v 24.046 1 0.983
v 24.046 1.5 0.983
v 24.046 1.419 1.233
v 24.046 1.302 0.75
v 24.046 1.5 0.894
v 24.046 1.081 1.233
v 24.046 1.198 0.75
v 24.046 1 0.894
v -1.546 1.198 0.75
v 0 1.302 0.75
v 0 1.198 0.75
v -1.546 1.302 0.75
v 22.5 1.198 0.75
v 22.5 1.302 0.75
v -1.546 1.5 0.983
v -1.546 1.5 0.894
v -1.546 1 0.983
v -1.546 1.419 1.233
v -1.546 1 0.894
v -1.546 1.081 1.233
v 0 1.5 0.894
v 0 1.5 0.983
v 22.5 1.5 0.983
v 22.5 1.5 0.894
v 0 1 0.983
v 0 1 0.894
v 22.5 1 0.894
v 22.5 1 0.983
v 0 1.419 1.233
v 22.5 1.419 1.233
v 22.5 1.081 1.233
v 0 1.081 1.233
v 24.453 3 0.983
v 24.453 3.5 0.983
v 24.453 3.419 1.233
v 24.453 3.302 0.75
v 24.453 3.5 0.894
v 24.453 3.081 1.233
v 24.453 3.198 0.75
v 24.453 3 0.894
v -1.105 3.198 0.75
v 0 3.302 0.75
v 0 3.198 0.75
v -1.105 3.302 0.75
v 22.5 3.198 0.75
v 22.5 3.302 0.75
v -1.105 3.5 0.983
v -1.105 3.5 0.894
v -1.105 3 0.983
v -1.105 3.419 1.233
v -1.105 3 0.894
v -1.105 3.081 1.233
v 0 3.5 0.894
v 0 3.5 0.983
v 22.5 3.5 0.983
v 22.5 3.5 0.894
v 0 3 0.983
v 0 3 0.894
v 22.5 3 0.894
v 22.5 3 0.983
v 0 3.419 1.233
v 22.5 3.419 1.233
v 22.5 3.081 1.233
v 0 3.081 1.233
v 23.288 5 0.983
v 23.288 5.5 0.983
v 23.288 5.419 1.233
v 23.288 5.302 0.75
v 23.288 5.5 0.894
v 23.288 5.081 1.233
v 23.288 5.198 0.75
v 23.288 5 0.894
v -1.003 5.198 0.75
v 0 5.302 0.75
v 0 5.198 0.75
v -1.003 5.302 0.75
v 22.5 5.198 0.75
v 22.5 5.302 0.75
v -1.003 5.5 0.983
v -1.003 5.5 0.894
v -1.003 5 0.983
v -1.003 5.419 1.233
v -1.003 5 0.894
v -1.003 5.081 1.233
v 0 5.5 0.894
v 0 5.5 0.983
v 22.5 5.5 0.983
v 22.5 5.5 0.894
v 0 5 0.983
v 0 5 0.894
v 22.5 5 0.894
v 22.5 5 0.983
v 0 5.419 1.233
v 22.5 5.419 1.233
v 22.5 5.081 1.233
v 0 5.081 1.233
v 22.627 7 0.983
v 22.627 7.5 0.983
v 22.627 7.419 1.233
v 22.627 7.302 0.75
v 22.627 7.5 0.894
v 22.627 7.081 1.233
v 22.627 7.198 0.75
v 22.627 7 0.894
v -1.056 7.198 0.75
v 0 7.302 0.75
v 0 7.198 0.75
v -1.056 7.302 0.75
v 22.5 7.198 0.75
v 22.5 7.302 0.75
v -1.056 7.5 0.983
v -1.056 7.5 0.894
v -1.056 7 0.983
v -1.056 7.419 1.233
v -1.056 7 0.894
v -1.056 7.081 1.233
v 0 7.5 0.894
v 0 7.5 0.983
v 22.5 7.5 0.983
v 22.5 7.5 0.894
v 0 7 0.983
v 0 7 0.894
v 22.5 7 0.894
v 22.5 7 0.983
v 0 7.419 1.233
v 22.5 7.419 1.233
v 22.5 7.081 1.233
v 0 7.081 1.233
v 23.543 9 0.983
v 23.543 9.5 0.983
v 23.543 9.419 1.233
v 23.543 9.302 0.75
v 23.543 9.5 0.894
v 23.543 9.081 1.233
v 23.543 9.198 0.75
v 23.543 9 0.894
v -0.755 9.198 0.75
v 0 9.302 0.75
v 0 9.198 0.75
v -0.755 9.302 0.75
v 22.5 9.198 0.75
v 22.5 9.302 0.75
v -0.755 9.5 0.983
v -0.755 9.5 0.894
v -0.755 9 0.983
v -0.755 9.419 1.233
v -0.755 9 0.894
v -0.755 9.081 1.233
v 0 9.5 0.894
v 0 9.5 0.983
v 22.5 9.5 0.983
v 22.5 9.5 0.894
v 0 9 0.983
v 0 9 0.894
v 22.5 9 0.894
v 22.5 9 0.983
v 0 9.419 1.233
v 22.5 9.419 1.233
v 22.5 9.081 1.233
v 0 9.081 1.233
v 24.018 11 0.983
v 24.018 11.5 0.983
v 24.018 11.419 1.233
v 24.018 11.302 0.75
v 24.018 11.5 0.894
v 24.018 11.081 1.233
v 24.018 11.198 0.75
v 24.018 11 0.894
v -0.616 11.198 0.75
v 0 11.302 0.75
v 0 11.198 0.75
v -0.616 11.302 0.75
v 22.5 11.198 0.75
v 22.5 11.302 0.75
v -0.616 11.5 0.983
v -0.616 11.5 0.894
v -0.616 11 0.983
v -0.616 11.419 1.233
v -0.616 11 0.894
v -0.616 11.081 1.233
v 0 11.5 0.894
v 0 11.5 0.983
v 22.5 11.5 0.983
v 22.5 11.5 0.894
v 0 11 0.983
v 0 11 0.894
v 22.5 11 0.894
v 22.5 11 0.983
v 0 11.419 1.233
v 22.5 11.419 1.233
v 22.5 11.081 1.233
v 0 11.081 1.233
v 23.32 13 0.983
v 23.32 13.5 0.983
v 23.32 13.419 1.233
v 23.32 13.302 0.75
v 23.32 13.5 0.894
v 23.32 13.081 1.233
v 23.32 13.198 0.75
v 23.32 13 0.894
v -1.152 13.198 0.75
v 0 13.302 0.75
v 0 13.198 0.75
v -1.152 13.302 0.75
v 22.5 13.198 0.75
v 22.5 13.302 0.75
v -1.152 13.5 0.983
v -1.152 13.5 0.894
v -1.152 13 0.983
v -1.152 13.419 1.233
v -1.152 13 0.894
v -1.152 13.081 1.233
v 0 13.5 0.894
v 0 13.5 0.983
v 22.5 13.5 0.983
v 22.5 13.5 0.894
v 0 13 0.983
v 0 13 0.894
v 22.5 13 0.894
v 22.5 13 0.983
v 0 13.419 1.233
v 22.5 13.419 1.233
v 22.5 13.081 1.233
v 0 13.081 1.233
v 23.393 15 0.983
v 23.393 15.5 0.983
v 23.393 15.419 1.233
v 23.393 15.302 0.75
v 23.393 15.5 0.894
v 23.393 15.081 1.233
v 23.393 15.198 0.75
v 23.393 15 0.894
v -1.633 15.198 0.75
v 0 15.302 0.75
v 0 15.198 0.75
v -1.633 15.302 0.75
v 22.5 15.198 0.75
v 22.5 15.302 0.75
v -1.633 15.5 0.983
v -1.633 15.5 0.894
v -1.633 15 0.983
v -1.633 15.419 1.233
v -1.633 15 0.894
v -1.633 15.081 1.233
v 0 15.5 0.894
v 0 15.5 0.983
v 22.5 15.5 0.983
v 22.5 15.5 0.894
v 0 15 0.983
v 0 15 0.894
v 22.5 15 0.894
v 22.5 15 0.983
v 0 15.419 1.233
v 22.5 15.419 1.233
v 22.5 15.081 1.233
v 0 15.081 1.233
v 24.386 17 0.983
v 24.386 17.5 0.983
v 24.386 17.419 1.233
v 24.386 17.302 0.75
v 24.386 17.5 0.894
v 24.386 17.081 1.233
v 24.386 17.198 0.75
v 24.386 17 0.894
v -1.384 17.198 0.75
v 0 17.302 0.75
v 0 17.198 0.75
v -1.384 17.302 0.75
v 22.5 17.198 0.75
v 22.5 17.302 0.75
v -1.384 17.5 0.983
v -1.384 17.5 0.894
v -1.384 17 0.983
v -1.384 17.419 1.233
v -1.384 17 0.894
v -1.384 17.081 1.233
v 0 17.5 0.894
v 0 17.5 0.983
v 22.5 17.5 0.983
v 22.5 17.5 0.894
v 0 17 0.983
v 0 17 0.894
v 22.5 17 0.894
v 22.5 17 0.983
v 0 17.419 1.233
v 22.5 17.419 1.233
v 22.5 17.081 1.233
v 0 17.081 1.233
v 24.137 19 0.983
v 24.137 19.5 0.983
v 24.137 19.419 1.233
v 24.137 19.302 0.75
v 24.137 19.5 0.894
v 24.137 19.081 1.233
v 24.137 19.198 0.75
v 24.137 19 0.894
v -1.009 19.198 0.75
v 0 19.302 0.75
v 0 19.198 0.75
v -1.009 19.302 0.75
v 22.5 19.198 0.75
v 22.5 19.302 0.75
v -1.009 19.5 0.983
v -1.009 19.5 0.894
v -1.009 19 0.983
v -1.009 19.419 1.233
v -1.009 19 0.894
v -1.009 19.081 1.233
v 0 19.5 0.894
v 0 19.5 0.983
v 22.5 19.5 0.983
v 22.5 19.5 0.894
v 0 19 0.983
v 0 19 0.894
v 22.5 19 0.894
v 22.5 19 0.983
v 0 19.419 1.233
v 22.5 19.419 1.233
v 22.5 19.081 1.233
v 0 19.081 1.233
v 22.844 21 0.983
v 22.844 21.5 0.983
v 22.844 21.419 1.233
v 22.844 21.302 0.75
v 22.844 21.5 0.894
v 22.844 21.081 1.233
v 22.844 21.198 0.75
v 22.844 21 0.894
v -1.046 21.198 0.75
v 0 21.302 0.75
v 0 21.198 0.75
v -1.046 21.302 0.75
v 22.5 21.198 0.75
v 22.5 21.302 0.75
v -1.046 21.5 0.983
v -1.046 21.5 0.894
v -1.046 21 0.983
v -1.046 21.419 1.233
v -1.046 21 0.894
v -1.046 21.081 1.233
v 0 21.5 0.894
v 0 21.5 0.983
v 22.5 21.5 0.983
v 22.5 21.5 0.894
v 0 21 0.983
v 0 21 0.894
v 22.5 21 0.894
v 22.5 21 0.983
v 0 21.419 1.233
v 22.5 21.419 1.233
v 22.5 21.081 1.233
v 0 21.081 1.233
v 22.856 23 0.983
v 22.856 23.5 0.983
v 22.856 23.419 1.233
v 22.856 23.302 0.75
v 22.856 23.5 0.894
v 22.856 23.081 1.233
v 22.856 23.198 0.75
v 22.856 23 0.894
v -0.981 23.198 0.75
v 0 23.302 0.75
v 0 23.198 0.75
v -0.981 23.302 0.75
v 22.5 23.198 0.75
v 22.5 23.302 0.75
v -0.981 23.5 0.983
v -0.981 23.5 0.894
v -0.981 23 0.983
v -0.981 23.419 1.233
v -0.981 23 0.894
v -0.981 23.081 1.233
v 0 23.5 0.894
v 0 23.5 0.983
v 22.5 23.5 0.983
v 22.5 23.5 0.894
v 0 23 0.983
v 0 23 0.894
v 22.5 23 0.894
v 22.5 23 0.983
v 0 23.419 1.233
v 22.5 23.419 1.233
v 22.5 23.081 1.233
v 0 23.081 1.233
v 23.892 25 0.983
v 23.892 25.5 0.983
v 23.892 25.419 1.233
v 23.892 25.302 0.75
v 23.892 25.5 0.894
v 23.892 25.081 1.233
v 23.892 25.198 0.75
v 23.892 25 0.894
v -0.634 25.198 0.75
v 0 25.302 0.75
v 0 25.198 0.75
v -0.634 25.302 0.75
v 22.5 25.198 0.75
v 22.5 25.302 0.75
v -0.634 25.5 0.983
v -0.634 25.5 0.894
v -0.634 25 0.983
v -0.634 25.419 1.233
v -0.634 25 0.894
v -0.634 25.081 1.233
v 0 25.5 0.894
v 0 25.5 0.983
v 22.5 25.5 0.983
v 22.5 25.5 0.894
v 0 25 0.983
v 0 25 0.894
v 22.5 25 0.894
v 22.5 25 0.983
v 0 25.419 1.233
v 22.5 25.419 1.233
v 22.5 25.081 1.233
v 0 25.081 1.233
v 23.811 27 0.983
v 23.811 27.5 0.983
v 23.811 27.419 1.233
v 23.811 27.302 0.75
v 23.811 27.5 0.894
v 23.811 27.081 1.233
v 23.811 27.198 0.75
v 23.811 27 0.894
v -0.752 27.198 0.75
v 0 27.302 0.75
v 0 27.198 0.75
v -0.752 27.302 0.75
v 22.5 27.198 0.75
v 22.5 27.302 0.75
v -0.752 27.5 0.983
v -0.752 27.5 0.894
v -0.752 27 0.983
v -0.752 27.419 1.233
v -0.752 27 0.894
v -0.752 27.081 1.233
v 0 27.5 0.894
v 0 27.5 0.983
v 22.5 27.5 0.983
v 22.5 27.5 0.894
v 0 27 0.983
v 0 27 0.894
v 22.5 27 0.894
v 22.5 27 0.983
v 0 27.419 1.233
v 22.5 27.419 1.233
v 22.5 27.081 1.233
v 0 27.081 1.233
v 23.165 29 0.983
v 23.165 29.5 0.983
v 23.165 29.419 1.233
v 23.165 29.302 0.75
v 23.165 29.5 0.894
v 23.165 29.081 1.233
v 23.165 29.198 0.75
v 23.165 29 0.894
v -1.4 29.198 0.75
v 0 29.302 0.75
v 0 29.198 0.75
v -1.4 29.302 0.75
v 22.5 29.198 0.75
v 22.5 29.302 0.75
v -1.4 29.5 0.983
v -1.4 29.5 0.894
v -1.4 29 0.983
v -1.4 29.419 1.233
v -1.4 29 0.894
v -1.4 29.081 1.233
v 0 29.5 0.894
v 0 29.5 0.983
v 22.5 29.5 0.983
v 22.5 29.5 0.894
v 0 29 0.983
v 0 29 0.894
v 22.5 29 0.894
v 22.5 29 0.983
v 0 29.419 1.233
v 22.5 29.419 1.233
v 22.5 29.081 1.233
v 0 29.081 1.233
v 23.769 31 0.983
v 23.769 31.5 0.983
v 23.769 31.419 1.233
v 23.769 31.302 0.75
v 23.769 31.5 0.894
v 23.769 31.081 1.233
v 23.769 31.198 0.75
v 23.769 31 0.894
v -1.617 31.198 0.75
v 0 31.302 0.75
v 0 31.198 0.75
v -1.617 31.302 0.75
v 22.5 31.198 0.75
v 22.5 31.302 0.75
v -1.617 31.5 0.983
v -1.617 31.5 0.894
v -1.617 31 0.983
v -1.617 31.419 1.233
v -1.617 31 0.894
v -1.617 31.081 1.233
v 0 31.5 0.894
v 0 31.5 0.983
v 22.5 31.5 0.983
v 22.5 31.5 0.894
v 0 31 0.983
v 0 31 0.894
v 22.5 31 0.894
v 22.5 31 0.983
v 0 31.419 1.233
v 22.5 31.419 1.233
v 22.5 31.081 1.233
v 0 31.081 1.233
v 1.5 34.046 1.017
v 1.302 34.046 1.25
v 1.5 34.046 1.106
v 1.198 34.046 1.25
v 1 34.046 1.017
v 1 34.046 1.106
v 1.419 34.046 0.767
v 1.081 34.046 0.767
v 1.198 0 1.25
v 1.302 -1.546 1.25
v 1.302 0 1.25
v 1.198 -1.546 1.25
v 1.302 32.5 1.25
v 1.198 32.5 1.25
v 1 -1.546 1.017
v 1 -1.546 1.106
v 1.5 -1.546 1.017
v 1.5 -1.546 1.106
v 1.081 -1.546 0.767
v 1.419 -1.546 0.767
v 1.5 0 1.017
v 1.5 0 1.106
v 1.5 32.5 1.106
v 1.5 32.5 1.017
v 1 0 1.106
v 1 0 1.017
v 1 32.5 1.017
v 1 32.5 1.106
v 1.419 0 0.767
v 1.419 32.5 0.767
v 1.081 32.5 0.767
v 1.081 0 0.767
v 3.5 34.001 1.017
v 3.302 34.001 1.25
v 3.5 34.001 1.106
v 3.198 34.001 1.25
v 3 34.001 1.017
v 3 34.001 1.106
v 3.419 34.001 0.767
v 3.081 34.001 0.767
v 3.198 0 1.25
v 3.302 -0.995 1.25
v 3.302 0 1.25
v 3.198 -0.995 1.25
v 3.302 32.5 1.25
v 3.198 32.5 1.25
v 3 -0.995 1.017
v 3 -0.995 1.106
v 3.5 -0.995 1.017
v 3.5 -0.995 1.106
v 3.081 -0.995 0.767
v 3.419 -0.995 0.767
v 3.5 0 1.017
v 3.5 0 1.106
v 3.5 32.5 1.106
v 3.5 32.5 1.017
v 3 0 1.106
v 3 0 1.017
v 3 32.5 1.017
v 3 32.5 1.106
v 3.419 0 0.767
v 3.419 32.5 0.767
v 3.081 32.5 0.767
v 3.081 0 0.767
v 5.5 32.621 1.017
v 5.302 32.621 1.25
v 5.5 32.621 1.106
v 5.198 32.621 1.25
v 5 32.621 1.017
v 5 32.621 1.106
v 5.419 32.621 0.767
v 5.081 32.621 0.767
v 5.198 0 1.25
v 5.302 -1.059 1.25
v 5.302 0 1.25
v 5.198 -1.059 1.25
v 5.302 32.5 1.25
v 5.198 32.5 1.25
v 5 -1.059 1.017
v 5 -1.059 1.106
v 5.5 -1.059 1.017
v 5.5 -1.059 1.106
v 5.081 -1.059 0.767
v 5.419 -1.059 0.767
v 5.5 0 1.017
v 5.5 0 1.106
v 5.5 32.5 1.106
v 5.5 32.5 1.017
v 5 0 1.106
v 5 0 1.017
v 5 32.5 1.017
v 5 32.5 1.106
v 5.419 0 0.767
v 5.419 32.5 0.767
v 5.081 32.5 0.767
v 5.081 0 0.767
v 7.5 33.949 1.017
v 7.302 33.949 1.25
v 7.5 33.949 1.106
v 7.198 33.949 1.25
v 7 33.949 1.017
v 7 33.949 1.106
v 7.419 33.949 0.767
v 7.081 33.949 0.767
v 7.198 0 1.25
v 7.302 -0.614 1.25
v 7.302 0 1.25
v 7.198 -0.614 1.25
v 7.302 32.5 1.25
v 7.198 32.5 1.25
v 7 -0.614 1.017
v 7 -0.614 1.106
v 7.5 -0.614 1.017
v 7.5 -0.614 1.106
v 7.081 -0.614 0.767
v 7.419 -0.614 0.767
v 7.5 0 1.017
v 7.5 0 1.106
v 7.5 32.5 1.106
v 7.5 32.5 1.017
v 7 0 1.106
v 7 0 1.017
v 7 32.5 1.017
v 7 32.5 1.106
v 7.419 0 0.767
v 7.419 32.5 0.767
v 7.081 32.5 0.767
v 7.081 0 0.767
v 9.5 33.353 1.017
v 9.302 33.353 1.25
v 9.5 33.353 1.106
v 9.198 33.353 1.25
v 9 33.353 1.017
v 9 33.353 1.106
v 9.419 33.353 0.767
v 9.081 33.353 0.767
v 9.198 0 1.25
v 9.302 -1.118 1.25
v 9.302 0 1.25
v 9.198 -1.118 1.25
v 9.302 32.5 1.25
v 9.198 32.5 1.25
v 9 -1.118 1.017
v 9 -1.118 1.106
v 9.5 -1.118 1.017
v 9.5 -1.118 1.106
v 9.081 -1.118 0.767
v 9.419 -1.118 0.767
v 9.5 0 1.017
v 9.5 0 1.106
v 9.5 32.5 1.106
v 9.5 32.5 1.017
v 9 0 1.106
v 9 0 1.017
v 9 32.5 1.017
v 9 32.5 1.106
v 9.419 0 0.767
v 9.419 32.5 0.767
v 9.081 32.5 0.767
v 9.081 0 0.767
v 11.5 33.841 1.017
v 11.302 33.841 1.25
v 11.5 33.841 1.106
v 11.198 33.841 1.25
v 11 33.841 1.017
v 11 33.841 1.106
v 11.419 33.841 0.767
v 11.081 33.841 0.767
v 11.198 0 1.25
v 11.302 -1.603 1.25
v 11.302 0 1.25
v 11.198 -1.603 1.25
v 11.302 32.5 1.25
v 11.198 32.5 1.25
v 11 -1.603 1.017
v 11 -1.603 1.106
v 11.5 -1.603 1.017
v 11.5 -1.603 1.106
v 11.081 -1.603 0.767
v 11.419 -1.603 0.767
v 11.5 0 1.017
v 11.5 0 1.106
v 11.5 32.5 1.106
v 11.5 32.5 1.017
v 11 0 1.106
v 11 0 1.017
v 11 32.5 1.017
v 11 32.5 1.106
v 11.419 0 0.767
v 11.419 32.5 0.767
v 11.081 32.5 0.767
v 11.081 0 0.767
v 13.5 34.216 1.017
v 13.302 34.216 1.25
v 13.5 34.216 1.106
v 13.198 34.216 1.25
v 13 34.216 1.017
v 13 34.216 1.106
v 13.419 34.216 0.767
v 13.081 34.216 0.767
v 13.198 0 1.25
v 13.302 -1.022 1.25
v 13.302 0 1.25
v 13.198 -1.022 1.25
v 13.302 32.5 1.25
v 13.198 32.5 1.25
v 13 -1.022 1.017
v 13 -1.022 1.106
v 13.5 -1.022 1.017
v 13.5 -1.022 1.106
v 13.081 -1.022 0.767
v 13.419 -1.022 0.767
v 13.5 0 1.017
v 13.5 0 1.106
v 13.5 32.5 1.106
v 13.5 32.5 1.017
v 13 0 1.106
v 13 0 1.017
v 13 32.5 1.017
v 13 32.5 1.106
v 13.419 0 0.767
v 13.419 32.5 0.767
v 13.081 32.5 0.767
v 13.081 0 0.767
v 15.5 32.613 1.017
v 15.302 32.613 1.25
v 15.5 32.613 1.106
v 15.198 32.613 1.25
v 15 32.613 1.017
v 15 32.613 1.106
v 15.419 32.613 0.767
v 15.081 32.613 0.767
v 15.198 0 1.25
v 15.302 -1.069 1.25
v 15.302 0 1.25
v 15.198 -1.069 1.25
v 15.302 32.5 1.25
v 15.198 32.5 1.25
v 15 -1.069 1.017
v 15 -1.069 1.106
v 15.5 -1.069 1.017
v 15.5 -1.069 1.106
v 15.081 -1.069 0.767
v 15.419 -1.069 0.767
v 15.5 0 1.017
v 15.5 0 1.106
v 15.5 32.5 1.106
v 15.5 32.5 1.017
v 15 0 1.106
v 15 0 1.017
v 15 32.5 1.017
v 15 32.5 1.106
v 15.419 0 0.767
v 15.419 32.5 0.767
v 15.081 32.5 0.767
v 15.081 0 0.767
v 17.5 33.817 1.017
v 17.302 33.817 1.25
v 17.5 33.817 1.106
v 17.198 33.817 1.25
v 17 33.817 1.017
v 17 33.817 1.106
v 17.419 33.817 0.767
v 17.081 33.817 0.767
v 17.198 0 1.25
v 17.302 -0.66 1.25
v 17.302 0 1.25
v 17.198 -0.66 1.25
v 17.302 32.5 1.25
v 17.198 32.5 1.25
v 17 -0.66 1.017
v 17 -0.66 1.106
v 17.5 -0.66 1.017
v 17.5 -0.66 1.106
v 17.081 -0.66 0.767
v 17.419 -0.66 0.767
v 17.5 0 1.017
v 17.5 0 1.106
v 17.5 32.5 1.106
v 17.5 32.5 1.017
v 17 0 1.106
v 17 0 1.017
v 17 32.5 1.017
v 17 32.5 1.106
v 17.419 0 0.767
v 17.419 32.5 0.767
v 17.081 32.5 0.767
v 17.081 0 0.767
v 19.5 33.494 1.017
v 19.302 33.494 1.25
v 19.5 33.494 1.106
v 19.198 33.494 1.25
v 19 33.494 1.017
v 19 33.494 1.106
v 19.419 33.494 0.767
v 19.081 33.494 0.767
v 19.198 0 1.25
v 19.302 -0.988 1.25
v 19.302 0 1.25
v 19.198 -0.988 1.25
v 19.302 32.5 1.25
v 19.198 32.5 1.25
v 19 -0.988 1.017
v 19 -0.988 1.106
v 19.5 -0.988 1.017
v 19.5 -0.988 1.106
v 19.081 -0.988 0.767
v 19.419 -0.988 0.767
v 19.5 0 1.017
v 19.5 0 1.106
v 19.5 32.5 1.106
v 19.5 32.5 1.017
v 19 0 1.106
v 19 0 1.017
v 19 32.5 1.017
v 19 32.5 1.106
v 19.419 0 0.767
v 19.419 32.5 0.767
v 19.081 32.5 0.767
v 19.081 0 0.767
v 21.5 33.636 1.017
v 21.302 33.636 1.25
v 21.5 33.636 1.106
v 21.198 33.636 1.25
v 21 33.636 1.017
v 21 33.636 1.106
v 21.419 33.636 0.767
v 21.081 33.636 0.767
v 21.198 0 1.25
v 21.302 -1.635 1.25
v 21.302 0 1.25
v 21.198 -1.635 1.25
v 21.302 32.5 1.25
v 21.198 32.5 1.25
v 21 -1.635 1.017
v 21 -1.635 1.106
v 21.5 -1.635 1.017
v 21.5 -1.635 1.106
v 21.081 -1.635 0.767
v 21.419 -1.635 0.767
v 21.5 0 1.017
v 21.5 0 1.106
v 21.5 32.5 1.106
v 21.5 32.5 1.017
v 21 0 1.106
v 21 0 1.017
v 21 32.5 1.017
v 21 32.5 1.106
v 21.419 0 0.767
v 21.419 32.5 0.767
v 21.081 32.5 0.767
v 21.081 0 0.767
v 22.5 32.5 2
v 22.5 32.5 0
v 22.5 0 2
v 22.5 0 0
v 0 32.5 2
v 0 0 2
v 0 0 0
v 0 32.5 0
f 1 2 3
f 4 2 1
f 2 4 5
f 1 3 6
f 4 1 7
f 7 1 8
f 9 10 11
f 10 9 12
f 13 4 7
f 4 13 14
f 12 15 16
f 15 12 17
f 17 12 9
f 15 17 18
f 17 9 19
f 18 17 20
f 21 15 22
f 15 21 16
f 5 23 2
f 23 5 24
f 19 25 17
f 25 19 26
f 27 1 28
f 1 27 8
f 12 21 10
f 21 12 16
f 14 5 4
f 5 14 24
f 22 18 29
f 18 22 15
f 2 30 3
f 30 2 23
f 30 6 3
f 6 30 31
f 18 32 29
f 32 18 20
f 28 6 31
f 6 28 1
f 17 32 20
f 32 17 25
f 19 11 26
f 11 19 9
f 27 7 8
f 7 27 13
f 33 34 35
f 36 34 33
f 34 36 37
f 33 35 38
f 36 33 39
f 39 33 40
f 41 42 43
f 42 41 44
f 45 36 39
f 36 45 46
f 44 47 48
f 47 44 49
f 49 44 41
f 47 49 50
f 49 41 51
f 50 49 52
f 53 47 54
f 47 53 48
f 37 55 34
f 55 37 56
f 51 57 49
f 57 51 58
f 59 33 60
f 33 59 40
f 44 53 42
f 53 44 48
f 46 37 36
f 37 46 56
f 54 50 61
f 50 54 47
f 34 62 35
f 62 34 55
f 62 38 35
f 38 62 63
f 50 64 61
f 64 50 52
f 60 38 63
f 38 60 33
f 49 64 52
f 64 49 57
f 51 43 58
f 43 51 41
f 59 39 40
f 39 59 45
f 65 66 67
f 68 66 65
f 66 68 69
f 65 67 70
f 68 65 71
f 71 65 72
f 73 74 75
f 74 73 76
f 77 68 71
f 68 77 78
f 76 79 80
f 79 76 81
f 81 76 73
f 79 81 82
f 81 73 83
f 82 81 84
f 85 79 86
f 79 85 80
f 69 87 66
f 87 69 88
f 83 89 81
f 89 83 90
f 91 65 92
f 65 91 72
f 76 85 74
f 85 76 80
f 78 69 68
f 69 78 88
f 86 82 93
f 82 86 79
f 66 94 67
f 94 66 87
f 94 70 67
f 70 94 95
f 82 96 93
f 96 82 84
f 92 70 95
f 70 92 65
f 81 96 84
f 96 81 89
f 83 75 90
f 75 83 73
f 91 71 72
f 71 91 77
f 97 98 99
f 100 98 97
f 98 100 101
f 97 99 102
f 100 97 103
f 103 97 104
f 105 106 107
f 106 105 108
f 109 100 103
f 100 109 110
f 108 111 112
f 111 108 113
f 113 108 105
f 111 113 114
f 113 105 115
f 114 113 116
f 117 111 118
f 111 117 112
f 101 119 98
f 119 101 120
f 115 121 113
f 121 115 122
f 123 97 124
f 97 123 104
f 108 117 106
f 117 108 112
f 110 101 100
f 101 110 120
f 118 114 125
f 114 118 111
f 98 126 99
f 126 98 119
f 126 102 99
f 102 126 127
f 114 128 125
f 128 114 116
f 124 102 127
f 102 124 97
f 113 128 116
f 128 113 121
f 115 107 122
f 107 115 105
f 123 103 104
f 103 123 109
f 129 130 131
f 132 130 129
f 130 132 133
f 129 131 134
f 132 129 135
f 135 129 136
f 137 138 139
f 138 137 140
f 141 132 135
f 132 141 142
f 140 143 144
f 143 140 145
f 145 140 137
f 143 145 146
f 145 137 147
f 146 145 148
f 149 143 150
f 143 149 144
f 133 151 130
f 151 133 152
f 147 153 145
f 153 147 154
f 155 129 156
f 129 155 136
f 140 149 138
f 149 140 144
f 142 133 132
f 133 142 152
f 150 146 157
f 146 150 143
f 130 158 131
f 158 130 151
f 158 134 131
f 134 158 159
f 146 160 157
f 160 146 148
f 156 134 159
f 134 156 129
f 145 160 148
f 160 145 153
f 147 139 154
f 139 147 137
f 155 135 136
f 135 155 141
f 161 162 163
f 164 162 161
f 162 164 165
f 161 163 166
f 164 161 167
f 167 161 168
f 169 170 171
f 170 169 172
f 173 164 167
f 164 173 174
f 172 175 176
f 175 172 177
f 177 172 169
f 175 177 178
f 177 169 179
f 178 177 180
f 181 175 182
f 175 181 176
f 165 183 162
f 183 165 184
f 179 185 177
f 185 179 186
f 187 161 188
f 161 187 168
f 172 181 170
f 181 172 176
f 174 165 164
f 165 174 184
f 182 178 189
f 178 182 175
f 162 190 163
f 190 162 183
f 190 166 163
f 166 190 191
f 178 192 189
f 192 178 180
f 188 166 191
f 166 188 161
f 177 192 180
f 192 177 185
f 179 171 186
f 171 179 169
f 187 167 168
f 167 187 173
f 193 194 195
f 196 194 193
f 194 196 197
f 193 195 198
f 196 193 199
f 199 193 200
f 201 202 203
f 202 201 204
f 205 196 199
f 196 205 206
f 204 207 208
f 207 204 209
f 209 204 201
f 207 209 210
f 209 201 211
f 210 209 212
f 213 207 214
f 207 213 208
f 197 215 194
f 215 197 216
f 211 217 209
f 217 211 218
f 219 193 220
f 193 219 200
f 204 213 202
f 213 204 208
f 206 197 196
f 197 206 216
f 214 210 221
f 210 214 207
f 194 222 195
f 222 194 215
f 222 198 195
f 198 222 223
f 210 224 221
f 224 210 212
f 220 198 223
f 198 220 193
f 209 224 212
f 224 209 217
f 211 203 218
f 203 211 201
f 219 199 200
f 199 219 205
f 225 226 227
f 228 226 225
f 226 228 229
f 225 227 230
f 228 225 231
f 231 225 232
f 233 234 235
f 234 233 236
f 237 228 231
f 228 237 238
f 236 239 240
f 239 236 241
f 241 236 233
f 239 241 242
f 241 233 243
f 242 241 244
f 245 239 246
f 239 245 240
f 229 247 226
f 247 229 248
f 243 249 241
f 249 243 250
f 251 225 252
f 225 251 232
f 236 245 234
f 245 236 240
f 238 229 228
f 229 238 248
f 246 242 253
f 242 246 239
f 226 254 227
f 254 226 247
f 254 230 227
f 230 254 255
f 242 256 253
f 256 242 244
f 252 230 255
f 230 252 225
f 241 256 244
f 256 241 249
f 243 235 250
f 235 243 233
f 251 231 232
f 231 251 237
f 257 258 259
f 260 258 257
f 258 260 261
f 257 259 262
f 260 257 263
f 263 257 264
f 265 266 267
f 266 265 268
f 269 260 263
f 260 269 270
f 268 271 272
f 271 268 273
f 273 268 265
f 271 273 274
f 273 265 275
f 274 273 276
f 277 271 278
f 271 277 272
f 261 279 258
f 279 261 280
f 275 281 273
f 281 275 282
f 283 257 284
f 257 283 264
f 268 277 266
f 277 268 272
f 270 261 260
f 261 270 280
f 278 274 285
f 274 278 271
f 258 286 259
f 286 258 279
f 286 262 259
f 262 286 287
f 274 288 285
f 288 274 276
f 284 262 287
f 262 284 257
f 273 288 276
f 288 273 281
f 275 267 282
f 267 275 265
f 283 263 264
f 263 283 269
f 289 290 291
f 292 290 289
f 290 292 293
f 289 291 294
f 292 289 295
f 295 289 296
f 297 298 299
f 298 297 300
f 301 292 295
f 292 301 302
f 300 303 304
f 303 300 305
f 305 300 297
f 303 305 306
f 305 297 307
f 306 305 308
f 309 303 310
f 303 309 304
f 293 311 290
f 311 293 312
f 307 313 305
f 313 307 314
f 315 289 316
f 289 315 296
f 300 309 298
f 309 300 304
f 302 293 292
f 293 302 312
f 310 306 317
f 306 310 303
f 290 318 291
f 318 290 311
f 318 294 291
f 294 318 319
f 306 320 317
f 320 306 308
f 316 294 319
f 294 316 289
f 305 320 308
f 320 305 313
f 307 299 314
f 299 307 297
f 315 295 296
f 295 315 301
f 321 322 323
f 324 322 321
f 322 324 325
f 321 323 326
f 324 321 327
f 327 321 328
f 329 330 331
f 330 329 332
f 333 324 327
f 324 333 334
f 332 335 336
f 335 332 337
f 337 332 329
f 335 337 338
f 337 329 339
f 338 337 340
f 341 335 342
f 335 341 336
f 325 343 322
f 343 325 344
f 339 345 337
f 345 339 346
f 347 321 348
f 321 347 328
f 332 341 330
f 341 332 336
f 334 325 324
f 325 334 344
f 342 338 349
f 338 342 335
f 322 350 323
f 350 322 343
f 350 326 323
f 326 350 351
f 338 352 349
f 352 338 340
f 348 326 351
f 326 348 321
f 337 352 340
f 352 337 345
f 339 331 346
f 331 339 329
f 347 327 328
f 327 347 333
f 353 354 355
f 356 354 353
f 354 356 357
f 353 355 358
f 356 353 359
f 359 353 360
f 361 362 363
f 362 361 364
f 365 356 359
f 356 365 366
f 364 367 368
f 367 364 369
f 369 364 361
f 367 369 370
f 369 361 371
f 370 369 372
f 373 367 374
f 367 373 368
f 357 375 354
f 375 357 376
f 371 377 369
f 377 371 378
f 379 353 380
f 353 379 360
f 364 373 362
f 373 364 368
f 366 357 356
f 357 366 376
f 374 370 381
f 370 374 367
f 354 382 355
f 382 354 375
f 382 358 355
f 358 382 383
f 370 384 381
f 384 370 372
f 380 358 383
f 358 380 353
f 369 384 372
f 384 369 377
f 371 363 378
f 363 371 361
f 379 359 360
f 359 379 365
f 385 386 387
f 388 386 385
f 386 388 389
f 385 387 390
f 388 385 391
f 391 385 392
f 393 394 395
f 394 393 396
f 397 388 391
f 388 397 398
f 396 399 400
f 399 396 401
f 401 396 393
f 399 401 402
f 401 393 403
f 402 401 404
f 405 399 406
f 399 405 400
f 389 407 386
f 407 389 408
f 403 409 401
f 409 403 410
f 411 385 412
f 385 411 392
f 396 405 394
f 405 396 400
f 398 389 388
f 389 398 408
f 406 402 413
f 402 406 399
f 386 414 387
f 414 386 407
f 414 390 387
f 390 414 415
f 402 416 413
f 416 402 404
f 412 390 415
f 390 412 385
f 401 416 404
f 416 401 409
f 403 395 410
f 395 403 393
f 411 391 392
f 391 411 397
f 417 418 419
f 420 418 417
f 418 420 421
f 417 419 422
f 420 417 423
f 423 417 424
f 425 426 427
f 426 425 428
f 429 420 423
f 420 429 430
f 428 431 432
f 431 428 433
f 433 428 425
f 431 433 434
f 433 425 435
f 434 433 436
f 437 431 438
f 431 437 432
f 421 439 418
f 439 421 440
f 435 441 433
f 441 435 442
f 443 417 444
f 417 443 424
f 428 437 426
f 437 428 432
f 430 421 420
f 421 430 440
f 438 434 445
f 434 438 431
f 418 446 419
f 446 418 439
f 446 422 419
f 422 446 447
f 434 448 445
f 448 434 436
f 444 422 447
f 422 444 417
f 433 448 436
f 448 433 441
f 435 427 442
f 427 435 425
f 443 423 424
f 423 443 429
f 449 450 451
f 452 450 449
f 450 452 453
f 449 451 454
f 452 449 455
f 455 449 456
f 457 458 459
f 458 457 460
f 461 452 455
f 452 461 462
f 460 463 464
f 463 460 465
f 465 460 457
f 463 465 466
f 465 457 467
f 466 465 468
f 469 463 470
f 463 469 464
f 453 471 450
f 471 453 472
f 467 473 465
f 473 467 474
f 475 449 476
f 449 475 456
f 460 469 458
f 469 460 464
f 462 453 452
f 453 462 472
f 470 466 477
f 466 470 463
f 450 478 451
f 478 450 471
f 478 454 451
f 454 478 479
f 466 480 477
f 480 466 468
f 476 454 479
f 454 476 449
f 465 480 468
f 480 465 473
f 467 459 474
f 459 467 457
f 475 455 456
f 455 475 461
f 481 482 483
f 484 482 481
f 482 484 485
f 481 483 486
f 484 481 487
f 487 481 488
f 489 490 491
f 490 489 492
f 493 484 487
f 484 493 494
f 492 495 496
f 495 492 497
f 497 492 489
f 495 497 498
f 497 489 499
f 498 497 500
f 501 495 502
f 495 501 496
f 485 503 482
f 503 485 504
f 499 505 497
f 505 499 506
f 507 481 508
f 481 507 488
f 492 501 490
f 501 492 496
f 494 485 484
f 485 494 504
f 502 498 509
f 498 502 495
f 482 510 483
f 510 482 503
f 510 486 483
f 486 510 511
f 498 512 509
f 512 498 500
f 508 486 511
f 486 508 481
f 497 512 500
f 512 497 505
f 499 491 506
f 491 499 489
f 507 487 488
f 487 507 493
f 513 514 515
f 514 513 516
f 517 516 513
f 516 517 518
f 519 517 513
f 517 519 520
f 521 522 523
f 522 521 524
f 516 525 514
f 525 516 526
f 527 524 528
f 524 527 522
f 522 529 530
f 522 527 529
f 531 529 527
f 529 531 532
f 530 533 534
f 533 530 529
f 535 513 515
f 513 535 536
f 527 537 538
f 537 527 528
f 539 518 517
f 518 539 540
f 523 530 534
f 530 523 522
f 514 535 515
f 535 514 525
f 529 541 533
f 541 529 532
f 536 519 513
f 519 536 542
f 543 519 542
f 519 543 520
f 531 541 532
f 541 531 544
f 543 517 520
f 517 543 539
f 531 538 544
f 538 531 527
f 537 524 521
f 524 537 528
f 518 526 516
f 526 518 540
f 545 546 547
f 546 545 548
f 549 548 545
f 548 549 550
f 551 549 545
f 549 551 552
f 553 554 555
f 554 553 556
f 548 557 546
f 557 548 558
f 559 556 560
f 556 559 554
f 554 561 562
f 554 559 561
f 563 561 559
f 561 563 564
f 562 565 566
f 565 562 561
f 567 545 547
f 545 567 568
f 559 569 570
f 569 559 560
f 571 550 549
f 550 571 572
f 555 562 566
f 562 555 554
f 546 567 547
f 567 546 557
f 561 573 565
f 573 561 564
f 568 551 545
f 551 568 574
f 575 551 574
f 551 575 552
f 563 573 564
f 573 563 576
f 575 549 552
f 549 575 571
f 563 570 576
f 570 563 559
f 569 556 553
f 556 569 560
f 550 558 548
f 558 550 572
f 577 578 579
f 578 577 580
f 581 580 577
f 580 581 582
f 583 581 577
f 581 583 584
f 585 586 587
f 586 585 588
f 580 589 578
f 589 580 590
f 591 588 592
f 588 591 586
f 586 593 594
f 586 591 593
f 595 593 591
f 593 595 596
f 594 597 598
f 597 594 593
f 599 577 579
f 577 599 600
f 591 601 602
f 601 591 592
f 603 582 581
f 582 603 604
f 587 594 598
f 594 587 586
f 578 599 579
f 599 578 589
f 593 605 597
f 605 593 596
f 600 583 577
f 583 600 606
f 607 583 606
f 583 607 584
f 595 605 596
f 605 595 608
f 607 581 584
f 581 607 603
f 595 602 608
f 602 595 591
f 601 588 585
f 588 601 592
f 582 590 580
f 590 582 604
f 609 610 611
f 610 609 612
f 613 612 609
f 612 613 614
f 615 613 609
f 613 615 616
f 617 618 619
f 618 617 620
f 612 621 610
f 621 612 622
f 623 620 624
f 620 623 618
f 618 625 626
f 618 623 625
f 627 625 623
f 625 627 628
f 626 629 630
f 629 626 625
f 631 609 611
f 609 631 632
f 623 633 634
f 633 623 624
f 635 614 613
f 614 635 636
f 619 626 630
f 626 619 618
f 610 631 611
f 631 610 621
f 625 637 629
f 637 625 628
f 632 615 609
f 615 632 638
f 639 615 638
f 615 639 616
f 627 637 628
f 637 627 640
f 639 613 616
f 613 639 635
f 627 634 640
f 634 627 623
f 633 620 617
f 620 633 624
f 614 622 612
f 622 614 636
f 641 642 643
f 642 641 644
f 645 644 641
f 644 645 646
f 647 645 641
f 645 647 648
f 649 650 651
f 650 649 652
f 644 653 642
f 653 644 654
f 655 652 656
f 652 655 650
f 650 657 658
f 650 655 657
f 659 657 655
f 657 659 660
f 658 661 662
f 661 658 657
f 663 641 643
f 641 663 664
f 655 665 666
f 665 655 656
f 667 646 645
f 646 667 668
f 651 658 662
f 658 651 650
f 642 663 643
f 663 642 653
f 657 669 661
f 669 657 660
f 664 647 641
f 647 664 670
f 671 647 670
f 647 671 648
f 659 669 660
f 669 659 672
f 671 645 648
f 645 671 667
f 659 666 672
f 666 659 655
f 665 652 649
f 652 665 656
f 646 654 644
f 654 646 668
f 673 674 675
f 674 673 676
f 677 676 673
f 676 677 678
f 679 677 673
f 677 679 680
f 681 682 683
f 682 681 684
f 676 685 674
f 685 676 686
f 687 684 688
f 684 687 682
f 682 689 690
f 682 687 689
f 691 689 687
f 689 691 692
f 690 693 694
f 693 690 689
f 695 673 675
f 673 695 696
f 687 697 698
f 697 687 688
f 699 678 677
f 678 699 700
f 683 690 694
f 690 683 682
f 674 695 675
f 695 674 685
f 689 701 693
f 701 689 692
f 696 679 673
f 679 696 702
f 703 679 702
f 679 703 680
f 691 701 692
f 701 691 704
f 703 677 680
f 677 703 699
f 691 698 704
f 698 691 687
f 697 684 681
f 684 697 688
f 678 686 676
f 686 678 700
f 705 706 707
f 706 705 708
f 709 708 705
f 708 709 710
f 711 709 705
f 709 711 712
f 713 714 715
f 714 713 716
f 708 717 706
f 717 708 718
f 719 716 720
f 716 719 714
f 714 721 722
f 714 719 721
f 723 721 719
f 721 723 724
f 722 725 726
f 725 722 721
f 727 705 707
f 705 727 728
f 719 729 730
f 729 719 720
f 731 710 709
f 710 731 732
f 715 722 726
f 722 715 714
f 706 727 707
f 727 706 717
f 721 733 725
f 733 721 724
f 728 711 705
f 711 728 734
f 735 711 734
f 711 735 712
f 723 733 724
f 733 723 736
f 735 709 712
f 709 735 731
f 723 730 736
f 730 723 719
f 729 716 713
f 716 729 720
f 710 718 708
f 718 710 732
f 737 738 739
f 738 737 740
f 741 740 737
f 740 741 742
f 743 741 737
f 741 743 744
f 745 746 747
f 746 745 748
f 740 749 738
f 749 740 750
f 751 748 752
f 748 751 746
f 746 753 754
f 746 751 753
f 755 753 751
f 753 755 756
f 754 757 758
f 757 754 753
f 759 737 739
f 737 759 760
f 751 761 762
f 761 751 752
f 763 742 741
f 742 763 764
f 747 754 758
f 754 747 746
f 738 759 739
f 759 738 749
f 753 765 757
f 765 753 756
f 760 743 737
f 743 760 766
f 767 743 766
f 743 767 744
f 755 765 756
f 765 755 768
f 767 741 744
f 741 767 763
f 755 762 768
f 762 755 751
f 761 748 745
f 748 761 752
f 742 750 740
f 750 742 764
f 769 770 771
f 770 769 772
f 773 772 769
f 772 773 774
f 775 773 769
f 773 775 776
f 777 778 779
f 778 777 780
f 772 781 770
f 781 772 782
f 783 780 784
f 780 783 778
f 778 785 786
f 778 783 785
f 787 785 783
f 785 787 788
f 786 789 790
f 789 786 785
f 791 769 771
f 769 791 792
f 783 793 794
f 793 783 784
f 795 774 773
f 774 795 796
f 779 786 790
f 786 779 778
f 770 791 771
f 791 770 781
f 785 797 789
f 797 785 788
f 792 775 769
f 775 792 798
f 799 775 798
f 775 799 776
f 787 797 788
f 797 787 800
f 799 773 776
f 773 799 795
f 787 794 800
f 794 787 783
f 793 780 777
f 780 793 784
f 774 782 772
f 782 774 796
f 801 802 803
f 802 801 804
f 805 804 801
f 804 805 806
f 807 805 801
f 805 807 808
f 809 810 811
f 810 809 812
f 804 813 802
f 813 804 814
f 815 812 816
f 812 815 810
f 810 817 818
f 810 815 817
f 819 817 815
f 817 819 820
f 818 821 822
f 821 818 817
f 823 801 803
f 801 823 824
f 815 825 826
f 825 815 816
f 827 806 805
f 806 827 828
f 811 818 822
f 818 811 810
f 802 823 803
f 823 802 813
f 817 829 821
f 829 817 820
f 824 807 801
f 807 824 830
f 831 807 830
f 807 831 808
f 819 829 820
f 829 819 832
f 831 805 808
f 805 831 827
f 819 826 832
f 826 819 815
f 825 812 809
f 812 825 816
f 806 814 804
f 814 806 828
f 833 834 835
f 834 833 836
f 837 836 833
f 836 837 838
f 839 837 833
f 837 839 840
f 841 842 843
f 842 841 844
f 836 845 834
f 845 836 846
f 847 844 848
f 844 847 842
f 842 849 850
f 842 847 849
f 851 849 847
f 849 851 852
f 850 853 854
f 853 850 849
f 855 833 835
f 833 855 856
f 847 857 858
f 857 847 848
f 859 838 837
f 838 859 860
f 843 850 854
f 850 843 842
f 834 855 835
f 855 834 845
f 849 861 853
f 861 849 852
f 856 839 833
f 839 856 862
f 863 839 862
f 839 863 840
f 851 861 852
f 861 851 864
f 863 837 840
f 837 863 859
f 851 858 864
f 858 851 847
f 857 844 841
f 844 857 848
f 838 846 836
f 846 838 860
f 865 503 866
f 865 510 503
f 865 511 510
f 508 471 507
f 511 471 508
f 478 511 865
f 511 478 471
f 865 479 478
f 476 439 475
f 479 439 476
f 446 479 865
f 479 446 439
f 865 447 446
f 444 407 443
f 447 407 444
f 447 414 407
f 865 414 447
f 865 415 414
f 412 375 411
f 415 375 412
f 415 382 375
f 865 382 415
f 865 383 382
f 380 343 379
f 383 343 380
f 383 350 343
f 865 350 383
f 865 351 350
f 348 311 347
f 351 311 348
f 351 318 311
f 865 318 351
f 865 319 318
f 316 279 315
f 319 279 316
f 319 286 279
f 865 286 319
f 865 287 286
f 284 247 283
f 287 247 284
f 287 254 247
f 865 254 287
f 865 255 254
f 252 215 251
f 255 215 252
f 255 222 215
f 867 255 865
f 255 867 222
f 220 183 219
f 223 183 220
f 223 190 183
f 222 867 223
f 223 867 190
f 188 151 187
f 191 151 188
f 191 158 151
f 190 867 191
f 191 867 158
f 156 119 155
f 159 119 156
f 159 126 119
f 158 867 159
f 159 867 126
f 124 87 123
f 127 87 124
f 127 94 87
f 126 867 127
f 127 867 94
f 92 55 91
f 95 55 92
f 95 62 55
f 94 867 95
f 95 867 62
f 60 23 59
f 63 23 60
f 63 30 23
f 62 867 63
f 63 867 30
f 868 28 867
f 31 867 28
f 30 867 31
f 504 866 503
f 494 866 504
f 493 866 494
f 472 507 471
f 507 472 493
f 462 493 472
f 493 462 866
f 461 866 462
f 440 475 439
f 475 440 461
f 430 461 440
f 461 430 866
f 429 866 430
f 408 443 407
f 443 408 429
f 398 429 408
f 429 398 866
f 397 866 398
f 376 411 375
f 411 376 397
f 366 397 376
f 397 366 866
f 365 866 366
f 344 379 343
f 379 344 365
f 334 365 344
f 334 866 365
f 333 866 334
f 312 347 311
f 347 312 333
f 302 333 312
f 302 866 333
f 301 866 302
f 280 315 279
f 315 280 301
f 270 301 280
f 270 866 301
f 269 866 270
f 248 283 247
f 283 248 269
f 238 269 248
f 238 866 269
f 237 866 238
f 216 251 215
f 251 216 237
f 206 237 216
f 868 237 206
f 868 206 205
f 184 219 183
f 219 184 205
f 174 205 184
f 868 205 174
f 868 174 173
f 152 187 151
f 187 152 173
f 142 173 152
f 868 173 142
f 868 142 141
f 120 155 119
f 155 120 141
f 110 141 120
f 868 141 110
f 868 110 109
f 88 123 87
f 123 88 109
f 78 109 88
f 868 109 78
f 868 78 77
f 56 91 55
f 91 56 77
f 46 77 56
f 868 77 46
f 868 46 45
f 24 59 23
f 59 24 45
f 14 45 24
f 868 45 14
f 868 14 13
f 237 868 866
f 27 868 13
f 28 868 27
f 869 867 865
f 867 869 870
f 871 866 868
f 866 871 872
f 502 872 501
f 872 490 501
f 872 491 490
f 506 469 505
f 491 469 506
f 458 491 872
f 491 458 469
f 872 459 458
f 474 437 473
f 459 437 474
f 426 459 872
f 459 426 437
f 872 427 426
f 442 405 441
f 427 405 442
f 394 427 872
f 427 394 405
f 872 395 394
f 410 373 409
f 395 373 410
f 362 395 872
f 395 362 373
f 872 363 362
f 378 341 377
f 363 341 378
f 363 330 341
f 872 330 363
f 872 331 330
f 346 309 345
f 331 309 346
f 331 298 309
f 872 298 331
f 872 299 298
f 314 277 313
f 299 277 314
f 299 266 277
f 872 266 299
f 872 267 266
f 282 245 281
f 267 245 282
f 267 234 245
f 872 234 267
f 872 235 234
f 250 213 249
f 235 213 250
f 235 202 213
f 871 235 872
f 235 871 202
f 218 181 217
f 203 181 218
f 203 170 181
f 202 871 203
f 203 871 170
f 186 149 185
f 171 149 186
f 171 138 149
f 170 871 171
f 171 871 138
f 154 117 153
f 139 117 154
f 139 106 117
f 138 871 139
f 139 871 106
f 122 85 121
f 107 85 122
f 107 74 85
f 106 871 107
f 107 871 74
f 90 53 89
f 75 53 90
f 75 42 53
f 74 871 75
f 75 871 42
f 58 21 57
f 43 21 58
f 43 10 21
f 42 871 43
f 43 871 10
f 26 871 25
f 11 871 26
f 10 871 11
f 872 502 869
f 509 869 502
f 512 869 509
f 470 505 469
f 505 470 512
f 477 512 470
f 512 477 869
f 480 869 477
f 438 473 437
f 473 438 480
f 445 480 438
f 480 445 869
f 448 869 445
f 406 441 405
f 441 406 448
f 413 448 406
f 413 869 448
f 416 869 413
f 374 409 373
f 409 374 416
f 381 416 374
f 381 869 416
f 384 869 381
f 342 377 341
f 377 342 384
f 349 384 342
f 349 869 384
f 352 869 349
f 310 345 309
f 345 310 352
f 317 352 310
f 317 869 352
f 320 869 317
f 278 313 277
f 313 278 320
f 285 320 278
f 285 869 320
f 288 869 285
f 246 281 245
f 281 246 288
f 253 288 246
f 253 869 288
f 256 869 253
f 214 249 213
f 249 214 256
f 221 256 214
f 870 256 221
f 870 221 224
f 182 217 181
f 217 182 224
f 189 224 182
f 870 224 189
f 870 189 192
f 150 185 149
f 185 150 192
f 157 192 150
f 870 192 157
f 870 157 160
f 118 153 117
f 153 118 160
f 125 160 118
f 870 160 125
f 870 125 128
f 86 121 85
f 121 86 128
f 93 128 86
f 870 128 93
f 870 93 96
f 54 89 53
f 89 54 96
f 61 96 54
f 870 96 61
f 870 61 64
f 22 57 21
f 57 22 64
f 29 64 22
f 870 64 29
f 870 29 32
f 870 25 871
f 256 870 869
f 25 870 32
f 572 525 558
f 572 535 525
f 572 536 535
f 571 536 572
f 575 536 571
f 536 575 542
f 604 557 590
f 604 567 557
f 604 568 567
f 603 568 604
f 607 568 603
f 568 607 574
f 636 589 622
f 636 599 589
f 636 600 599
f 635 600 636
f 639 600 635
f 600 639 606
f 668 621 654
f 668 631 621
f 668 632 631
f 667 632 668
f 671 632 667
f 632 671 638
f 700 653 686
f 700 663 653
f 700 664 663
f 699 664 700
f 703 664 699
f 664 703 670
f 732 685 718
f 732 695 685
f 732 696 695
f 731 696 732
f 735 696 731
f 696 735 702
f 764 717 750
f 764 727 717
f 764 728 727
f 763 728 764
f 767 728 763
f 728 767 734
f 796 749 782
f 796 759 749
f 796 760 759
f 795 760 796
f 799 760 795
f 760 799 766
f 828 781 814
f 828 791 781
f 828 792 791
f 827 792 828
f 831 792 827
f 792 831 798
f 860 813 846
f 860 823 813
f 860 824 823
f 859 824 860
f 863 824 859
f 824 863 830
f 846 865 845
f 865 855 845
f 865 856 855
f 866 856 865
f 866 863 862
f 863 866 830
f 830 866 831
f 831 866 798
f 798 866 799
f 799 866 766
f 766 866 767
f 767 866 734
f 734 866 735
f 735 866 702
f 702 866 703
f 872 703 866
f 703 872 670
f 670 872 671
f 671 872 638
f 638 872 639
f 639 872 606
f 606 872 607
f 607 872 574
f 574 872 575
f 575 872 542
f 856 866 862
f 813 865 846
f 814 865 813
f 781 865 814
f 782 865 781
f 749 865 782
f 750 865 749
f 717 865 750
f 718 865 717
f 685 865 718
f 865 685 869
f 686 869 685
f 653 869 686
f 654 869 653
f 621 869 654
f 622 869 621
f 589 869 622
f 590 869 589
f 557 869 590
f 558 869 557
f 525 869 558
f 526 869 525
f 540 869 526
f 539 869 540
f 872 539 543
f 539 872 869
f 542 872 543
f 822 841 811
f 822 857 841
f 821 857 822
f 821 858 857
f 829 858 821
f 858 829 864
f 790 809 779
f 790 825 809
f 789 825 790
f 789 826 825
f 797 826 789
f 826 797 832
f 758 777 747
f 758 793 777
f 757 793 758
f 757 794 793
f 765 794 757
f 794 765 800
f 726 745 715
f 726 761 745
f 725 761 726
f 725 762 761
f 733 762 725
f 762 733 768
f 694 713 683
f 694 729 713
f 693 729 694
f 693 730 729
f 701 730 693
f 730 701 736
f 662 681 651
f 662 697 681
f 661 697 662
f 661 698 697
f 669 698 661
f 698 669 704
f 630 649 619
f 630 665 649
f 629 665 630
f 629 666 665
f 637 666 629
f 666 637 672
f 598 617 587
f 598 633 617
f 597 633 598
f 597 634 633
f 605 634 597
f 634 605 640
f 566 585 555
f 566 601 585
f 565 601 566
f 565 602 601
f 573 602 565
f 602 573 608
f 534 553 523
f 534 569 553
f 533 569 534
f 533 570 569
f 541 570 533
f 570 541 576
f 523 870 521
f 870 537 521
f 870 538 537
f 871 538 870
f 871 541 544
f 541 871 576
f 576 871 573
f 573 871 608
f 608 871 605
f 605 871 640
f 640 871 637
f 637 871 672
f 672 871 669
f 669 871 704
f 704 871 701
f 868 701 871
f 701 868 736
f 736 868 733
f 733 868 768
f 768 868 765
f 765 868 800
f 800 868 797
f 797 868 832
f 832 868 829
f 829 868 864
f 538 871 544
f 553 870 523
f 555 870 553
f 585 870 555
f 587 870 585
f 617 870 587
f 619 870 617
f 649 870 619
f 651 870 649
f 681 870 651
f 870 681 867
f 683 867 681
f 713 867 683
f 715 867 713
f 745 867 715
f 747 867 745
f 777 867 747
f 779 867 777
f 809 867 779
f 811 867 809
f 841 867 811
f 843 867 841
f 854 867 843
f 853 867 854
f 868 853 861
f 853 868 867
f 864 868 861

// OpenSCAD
// file: bar.scad
module bar (length, thickness) {
    intersection() {
        cube([length, thickness, thickness]);

        translate([0, thickness / 2, thickness / 2]) rotate([0, 90, 0]) {
            cylinder(length, d = thickness * 1.15);
        }
    }
}

module bars (length, width, thickness, spacing) {
    for (y = [0 : spacing : width]) {
        translate([0, y, 0]) {
            bar(length, thickness);
        }
    }
}
// main file
use <./bar.scad>;

module slab (
    size,
    thickness,
    bar_thickness,
    bar_spacing,
    bar_inset,
    position = [0, 0, 0],
    rotation = [0, 0, 0],
    colour = "gray"
) {

    module broken_bars (max_length, min_length, width, thickness, spacing) {
        function length_at(y) =
            let(angle = y / width * 360)
                min_length +
                (max_length - min_length) *
                sin(angle + 34) *
                cos(angle - 12) *
                cos(angle * 2 + 3);

        for (y = [0 : spacing : width]) {
            length = length_at(y);

            translate([(max_length - length_at(width - y)) / 2, y, 0]) {
                bar(length_at(y), thickness);
            }
        }
    }

    length = size.x;
    width = size.y;

    translate(position)
    rotate(rotation)
    intersection() {
        union() {
            color(colour) cube([length, width, thickness]);

            color("dimgray") for(z = [bar_inset : bar_spacing : thickness - bar_inset]) {
                translate([0, 0, z]) {
                    translate([-bar_spacing, bar_inset, -bar_thickness / 2]) {
                        broken_bars(
                            length + 2 * bar_spacing,
                            length + bar_spacing,
                            width - 2 * bar_inset,
                            bar_thickness,
                            bar_spacing
                        );
                    }

                    rotate([180, 0, 90]) translate([-bar_spacing, bar_inset, -bar_thickness / 2]) {
                        broken_bars(
                            width + 2 * bar_spacing,
                            width + bar_spacing,
                            length - 2 * bar_inset,
                            bar_thickness,
                            bar_spacing
                        );
                    }
                }
            }
        }

        if ($children > 0) children();
    }
}

slab([22.5, 32.5], 2, 0.5, 2, 1);
